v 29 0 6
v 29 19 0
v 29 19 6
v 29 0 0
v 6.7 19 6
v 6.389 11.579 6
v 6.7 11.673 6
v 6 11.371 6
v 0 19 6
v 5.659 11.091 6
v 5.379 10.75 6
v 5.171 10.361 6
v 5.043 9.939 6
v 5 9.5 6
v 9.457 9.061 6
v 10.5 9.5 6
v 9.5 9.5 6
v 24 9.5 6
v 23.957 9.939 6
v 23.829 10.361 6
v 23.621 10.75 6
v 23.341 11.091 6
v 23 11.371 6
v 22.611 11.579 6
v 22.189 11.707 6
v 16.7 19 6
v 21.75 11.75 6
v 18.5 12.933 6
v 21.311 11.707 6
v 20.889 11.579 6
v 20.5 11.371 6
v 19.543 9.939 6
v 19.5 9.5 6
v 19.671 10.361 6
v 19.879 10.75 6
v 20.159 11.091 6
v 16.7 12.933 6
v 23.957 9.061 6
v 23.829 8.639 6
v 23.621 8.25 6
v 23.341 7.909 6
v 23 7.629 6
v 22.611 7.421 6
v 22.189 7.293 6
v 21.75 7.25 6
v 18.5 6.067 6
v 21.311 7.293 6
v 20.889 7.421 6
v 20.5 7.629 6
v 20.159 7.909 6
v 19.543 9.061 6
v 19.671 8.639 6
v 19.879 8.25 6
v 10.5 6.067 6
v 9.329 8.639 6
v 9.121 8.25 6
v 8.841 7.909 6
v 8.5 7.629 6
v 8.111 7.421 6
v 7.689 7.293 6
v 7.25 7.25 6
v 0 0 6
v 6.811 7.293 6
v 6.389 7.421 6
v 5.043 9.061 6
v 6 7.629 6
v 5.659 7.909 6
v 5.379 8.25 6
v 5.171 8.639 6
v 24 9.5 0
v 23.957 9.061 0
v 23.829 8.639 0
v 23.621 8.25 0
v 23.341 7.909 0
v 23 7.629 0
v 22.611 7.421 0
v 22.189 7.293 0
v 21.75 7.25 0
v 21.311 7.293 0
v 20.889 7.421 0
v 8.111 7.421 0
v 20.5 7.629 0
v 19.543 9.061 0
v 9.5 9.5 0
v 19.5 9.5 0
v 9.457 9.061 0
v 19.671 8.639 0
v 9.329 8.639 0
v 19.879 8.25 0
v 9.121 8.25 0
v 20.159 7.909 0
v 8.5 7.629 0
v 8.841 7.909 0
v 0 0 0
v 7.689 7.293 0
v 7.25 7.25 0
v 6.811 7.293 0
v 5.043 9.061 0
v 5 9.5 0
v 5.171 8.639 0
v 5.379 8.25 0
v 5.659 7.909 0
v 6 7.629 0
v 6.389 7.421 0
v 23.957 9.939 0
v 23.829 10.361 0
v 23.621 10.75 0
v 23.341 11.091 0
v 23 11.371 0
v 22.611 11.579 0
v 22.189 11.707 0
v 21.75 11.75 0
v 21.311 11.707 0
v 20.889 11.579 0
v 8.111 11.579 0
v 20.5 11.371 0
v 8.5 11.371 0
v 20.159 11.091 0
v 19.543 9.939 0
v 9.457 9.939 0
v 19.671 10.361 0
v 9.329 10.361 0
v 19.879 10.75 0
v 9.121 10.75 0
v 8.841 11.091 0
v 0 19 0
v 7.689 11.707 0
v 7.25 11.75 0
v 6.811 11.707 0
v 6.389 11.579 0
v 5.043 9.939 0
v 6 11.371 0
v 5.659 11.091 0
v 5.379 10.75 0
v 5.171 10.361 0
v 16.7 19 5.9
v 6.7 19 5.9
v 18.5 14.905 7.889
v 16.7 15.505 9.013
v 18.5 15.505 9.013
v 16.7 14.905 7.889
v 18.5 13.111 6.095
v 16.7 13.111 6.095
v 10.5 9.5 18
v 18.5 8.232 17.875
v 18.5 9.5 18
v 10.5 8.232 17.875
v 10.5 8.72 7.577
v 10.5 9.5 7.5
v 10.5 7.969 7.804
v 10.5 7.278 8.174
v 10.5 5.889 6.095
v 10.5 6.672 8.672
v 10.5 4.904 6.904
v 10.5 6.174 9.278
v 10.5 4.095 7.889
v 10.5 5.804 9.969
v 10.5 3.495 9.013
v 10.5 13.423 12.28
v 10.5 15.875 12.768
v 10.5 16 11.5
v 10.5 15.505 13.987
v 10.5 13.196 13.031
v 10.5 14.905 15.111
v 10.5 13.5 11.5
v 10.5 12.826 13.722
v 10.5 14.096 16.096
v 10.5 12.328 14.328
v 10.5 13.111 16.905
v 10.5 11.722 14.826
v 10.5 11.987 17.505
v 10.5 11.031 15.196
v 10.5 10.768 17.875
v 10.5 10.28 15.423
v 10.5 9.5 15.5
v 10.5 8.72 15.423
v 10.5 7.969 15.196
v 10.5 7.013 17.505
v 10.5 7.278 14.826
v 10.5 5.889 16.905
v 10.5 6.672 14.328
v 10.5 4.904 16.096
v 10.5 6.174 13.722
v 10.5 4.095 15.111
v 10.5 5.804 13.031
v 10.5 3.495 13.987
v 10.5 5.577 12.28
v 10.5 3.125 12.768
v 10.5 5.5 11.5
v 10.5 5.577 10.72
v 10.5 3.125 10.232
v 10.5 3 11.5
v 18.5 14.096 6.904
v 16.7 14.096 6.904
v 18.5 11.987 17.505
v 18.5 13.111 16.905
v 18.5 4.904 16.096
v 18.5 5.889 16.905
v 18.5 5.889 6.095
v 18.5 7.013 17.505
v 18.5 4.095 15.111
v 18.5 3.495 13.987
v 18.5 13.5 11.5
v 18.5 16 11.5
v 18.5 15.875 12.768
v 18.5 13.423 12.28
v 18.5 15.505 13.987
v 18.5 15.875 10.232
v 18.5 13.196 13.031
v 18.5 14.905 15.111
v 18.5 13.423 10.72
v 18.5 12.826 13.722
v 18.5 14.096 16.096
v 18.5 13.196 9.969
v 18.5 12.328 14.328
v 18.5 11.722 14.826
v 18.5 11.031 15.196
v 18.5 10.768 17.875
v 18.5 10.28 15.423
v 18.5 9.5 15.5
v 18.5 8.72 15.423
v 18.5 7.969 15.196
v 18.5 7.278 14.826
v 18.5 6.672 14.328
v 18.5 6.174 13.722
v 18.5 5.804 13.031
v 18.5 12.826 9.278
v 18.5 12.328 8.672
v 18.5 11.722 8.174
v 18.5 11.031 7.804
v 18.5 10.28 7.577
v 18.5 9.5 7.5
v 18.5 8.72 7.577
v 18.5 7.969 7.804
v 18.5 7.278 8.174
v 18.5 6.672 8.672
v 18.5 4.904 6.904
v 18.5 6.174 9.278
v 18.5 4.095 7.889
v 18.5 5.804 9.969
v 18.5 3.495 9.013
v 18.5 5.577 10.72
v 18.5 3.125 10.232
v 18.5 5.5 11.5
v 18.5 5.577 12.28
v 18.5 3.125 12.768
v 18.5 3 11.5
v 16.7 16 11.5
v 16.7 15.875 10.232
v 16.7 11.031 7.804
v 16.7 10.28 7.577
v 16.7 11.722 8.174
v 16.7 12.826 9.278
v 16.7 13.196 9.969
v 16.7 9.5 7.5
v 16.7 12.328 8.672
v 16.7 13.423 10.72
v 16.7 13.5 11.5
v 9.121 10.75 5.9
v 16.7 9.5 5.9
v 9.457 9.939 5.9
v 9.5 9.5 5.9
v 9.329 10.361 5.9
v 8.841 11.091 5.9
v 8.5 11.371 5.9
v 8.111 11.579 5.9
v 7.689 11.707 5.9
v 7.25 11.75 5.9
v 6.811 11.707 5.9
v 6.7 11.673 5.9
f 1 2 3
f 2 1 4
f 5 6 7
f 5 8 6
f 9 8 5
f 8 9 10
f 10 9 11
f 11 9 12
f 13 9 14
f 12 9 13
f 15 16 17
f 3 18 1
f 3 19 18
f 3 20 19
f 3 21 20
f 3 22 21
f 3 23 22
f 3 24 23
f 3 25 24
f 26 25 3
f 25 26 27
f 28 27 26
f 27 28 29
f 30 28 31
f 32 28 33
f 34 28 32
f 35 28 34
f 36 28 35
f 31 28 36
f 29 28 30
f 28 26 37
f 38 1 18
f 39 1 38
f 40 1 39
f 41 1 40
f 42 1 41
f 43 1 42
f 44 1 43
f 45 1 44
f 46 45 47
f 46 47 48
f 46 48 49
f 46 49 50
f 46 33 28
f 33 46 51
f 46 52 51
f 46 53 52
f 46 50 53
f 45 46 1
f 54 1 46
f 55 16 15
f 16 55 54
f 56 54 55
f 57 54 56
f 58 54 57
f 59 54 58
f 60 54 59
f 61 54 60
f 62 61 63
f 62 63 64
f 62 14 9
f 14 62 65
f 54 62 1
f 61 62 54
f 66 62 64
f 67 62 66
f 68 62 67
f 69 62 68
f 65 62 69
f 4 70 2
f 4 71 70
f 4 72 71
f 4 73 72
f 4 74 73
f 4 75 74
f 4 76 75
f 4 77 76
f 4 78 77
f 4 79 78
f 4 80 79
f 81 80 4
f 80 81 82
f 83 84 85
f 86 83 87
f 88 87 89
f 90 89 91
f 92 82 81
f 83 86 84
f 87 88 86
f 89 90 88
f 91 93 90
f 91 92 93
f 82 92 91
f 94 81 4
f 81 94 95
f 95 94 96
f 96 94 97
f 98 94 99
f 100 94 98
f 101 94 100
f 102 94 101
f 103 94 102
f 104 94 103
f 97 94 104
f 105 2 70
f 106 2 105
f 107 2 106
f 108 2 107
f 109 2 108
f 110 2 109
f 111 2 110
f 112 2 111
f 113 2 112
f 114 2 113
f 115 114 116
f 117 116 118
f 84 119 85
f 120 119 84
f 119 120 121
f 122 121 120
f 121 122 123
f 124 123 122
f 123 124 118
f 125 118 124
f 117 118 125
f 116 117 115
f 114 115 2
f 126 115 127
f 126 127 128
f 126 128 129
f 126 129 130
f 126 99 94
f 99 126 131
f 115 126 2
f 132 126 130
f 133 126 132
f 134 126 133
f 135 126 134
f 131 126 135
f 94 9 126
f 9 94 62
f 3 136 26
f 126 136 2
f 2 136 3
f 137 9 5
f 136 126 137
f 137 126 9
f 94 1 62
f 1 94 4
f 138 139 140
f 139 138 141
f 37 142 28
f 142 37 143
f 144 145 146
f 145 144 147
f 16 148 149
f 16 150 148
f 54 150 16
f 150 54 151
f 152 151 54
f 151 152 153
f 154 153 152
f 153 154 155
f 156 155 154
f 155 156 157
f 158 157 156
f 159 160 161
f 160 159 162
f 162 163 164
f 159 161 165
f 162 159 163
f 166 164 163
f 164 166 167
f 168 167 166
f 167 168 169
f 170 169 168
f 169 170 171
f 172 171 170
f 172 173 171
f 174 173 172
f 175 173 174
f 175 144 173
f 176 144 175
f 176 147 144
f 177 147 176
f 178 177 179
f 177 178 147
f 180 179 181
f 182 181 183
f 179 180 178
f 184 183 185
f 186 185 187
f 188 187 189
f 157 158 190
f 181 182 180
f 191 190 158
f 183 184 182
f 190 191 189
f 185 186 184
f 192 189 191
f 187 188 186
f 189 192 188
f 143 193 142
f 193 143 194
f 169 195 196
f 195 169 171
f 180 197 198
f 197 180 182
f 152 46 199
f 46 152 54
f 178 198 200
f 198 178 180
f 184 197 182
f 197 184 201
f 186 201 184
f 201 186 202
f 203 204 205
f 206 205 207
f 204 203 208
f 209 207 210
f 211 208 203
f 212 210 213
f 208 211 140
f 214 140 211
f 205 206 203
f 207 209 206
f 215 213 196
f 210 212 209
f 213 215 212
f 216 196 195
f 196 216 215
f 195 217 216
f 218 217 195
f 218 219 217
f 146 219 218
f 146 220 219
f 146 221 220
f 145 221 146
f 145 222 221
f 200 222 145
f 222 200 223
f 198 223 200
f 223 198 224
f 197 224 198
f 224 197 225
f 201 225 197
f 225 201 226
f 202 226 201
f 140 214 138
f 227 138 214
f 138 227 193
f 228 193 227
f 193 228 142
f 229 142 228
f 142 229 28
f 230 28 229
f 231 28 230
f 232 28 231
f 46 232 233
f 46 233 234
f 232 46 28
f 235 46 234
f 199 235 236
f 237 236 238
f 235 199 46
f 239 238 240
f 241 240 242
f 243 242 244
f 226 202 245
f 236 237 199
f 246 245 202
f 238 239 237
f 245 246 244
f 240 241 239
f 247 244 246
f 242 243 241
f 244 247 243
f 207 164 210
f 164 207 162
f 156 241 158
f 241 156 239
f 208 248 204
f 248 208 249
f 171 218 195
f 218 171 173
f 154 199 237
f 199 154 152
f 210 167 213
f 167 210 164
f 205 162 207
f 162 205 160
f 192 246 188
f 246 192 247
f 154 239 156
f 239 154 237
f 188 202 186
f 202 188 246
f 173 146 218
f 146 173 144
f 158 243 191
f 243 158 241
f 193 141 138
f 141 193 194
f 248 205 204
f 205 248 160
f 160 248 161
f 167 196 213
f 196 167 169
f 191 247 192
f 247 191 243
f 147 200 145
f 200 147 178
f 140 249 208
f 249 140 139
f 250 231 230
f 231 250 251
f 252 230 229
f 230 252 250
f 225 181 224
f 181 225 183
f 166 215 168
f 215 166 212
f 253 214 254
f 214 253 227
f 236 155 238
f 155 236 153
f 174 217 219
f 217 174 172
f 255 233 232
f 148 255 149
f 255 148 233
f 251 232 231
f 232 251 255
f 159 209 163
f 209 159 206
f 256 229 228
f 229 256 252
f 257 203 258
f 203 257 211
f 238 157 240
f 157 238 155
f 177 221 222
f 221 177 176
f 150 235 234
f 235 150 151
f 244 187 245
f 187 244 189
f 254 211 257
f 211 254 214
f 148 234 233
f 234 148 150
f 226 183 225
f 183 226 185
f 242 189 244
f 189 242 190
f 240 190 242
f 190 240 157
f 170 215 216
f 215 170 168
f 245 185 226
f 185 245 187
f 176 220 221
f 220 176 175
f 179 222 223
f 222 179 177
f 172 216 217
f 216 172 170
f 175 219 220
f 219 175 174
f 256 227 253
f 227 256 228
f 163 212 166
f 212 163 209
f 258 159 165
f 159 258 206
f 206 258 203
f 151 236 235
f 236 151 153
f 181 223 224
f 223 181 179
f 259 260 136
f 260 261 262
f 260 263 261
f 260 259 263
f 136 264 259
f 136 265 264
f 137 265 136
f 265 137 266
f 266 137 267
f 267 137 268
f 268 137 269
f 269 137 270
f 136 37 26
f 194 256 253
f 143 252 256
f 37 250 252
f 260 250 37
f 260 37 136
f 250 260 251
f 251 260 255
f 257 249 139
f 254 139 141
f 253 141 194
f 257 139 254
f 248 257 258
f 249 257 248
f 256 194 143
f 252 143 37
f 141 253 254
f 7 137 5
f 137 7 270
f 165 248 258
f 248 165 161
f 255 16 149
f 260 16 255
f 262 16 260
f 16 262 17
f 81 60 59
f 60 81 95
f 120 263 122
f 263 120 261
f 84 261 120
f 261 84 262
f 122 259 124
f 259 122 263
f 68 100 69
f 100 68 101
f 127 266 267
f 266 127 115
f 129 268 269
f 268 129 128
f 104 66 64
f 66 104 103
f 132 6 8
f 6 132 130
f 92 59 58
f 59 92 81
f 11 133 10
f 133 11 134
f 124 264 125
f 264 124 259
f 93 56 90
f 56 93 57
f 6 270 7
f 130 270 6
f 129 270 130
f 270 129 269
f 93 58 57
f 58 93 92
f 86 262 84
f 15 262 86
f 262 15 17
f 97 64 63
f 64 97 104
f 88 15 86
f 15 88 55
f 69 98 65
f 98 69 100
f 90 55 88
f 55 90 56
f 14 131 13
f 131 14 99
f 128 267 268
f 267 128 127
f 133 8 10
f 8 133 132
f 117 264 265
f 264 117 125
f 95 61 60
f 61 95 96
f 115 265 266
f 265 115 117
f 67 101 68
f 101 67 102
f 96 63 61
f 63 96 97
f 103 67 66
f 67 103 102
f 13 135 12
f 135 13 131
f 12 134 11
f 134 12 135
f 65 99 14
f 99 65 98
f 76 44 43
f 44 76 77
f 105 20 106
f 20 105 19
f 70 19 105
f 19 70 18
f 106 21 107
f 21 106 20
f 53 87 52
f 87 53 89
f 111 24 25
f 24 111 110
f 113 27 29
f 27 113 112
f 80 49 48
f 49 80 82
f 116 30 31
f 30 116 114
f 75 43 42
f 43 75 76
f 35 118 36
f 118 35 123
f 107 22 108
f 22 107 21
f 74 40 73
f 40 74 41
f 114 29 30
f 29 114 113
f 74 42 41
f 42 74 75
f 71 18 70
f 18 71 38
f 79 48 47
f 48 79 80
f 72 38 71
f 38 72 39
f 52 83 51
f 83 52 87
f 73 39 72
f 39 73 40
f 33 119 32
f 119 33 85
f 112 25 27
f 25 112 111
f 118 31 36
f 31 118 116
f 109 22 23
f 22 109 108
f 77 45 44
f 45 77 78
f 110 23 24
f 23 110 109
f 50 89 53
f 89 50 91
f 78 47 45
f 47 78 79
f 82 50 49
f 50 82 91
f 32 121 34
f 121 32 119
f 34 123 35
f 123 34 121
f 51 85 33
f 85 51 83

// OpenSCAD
$fn = 32;

// ----------------------------------------------------------------------
// Cable clip: cable 8 mm, clamp 13 mm, base 29 mm
// ----------------------------------------------------------------------

// --- parameters (mm) ---
plate_x = 29;             // base length, X
plate_y = 19;             // base width, Y
plate_t = 6;              // base thickness
wire_seat_d = 13;         // clamp outside diameter
clip_t = 2.5;             // clamp wall
cable_d = 8;              // cable opening
ring_w = 8;               // clamp width along the cable
screw_d = 4.5;            // screw clearance
throat = 5.6;             // snap throat width
sink = 1;                 // overlap of the clamp into the base

module base() {
  cube([plate_x, plate_y, plate_t]);
}

module clamp() {
  translate([plate_x / 2, plate_y / 2, plate_t + wire_seat_d / 2 - sink]) rotate([0, 90, 0])
    cylinder(h = ring_w, d = wire_seat_d, center = true);
}

difference() {
  union() {
    base();
    clamp();
  }
  translate([plate_x / 2, plate_y / 2, plate_t + wire_seat_d / 2 - sink]) rotate([0, 90, 0]) translate([0, 0, -ring_w / 2 - 1]) cylinder(h = ring_w + 2, d = cable_d);
  /* snap throat: the opening is narrower than the cable */
  translate([plate_x / 2 - throat / 2, plate_y / 2, plate_t + wire_seat_d / 2 - sink]) rotate([0, 90, 0]) translate([0, 0, -ring_w / 2 - 1]) cube([throat, wire_seat_d + 2, ring_w + 2]);
  translate([7.25, plate_y / 2, -1]) cylinder(h = plate_t + 2, d = screw_d);
  translate([21.75, plate_y / 2, -1]) cylinder(h = plate_t + 2, d = screw_d);
}
